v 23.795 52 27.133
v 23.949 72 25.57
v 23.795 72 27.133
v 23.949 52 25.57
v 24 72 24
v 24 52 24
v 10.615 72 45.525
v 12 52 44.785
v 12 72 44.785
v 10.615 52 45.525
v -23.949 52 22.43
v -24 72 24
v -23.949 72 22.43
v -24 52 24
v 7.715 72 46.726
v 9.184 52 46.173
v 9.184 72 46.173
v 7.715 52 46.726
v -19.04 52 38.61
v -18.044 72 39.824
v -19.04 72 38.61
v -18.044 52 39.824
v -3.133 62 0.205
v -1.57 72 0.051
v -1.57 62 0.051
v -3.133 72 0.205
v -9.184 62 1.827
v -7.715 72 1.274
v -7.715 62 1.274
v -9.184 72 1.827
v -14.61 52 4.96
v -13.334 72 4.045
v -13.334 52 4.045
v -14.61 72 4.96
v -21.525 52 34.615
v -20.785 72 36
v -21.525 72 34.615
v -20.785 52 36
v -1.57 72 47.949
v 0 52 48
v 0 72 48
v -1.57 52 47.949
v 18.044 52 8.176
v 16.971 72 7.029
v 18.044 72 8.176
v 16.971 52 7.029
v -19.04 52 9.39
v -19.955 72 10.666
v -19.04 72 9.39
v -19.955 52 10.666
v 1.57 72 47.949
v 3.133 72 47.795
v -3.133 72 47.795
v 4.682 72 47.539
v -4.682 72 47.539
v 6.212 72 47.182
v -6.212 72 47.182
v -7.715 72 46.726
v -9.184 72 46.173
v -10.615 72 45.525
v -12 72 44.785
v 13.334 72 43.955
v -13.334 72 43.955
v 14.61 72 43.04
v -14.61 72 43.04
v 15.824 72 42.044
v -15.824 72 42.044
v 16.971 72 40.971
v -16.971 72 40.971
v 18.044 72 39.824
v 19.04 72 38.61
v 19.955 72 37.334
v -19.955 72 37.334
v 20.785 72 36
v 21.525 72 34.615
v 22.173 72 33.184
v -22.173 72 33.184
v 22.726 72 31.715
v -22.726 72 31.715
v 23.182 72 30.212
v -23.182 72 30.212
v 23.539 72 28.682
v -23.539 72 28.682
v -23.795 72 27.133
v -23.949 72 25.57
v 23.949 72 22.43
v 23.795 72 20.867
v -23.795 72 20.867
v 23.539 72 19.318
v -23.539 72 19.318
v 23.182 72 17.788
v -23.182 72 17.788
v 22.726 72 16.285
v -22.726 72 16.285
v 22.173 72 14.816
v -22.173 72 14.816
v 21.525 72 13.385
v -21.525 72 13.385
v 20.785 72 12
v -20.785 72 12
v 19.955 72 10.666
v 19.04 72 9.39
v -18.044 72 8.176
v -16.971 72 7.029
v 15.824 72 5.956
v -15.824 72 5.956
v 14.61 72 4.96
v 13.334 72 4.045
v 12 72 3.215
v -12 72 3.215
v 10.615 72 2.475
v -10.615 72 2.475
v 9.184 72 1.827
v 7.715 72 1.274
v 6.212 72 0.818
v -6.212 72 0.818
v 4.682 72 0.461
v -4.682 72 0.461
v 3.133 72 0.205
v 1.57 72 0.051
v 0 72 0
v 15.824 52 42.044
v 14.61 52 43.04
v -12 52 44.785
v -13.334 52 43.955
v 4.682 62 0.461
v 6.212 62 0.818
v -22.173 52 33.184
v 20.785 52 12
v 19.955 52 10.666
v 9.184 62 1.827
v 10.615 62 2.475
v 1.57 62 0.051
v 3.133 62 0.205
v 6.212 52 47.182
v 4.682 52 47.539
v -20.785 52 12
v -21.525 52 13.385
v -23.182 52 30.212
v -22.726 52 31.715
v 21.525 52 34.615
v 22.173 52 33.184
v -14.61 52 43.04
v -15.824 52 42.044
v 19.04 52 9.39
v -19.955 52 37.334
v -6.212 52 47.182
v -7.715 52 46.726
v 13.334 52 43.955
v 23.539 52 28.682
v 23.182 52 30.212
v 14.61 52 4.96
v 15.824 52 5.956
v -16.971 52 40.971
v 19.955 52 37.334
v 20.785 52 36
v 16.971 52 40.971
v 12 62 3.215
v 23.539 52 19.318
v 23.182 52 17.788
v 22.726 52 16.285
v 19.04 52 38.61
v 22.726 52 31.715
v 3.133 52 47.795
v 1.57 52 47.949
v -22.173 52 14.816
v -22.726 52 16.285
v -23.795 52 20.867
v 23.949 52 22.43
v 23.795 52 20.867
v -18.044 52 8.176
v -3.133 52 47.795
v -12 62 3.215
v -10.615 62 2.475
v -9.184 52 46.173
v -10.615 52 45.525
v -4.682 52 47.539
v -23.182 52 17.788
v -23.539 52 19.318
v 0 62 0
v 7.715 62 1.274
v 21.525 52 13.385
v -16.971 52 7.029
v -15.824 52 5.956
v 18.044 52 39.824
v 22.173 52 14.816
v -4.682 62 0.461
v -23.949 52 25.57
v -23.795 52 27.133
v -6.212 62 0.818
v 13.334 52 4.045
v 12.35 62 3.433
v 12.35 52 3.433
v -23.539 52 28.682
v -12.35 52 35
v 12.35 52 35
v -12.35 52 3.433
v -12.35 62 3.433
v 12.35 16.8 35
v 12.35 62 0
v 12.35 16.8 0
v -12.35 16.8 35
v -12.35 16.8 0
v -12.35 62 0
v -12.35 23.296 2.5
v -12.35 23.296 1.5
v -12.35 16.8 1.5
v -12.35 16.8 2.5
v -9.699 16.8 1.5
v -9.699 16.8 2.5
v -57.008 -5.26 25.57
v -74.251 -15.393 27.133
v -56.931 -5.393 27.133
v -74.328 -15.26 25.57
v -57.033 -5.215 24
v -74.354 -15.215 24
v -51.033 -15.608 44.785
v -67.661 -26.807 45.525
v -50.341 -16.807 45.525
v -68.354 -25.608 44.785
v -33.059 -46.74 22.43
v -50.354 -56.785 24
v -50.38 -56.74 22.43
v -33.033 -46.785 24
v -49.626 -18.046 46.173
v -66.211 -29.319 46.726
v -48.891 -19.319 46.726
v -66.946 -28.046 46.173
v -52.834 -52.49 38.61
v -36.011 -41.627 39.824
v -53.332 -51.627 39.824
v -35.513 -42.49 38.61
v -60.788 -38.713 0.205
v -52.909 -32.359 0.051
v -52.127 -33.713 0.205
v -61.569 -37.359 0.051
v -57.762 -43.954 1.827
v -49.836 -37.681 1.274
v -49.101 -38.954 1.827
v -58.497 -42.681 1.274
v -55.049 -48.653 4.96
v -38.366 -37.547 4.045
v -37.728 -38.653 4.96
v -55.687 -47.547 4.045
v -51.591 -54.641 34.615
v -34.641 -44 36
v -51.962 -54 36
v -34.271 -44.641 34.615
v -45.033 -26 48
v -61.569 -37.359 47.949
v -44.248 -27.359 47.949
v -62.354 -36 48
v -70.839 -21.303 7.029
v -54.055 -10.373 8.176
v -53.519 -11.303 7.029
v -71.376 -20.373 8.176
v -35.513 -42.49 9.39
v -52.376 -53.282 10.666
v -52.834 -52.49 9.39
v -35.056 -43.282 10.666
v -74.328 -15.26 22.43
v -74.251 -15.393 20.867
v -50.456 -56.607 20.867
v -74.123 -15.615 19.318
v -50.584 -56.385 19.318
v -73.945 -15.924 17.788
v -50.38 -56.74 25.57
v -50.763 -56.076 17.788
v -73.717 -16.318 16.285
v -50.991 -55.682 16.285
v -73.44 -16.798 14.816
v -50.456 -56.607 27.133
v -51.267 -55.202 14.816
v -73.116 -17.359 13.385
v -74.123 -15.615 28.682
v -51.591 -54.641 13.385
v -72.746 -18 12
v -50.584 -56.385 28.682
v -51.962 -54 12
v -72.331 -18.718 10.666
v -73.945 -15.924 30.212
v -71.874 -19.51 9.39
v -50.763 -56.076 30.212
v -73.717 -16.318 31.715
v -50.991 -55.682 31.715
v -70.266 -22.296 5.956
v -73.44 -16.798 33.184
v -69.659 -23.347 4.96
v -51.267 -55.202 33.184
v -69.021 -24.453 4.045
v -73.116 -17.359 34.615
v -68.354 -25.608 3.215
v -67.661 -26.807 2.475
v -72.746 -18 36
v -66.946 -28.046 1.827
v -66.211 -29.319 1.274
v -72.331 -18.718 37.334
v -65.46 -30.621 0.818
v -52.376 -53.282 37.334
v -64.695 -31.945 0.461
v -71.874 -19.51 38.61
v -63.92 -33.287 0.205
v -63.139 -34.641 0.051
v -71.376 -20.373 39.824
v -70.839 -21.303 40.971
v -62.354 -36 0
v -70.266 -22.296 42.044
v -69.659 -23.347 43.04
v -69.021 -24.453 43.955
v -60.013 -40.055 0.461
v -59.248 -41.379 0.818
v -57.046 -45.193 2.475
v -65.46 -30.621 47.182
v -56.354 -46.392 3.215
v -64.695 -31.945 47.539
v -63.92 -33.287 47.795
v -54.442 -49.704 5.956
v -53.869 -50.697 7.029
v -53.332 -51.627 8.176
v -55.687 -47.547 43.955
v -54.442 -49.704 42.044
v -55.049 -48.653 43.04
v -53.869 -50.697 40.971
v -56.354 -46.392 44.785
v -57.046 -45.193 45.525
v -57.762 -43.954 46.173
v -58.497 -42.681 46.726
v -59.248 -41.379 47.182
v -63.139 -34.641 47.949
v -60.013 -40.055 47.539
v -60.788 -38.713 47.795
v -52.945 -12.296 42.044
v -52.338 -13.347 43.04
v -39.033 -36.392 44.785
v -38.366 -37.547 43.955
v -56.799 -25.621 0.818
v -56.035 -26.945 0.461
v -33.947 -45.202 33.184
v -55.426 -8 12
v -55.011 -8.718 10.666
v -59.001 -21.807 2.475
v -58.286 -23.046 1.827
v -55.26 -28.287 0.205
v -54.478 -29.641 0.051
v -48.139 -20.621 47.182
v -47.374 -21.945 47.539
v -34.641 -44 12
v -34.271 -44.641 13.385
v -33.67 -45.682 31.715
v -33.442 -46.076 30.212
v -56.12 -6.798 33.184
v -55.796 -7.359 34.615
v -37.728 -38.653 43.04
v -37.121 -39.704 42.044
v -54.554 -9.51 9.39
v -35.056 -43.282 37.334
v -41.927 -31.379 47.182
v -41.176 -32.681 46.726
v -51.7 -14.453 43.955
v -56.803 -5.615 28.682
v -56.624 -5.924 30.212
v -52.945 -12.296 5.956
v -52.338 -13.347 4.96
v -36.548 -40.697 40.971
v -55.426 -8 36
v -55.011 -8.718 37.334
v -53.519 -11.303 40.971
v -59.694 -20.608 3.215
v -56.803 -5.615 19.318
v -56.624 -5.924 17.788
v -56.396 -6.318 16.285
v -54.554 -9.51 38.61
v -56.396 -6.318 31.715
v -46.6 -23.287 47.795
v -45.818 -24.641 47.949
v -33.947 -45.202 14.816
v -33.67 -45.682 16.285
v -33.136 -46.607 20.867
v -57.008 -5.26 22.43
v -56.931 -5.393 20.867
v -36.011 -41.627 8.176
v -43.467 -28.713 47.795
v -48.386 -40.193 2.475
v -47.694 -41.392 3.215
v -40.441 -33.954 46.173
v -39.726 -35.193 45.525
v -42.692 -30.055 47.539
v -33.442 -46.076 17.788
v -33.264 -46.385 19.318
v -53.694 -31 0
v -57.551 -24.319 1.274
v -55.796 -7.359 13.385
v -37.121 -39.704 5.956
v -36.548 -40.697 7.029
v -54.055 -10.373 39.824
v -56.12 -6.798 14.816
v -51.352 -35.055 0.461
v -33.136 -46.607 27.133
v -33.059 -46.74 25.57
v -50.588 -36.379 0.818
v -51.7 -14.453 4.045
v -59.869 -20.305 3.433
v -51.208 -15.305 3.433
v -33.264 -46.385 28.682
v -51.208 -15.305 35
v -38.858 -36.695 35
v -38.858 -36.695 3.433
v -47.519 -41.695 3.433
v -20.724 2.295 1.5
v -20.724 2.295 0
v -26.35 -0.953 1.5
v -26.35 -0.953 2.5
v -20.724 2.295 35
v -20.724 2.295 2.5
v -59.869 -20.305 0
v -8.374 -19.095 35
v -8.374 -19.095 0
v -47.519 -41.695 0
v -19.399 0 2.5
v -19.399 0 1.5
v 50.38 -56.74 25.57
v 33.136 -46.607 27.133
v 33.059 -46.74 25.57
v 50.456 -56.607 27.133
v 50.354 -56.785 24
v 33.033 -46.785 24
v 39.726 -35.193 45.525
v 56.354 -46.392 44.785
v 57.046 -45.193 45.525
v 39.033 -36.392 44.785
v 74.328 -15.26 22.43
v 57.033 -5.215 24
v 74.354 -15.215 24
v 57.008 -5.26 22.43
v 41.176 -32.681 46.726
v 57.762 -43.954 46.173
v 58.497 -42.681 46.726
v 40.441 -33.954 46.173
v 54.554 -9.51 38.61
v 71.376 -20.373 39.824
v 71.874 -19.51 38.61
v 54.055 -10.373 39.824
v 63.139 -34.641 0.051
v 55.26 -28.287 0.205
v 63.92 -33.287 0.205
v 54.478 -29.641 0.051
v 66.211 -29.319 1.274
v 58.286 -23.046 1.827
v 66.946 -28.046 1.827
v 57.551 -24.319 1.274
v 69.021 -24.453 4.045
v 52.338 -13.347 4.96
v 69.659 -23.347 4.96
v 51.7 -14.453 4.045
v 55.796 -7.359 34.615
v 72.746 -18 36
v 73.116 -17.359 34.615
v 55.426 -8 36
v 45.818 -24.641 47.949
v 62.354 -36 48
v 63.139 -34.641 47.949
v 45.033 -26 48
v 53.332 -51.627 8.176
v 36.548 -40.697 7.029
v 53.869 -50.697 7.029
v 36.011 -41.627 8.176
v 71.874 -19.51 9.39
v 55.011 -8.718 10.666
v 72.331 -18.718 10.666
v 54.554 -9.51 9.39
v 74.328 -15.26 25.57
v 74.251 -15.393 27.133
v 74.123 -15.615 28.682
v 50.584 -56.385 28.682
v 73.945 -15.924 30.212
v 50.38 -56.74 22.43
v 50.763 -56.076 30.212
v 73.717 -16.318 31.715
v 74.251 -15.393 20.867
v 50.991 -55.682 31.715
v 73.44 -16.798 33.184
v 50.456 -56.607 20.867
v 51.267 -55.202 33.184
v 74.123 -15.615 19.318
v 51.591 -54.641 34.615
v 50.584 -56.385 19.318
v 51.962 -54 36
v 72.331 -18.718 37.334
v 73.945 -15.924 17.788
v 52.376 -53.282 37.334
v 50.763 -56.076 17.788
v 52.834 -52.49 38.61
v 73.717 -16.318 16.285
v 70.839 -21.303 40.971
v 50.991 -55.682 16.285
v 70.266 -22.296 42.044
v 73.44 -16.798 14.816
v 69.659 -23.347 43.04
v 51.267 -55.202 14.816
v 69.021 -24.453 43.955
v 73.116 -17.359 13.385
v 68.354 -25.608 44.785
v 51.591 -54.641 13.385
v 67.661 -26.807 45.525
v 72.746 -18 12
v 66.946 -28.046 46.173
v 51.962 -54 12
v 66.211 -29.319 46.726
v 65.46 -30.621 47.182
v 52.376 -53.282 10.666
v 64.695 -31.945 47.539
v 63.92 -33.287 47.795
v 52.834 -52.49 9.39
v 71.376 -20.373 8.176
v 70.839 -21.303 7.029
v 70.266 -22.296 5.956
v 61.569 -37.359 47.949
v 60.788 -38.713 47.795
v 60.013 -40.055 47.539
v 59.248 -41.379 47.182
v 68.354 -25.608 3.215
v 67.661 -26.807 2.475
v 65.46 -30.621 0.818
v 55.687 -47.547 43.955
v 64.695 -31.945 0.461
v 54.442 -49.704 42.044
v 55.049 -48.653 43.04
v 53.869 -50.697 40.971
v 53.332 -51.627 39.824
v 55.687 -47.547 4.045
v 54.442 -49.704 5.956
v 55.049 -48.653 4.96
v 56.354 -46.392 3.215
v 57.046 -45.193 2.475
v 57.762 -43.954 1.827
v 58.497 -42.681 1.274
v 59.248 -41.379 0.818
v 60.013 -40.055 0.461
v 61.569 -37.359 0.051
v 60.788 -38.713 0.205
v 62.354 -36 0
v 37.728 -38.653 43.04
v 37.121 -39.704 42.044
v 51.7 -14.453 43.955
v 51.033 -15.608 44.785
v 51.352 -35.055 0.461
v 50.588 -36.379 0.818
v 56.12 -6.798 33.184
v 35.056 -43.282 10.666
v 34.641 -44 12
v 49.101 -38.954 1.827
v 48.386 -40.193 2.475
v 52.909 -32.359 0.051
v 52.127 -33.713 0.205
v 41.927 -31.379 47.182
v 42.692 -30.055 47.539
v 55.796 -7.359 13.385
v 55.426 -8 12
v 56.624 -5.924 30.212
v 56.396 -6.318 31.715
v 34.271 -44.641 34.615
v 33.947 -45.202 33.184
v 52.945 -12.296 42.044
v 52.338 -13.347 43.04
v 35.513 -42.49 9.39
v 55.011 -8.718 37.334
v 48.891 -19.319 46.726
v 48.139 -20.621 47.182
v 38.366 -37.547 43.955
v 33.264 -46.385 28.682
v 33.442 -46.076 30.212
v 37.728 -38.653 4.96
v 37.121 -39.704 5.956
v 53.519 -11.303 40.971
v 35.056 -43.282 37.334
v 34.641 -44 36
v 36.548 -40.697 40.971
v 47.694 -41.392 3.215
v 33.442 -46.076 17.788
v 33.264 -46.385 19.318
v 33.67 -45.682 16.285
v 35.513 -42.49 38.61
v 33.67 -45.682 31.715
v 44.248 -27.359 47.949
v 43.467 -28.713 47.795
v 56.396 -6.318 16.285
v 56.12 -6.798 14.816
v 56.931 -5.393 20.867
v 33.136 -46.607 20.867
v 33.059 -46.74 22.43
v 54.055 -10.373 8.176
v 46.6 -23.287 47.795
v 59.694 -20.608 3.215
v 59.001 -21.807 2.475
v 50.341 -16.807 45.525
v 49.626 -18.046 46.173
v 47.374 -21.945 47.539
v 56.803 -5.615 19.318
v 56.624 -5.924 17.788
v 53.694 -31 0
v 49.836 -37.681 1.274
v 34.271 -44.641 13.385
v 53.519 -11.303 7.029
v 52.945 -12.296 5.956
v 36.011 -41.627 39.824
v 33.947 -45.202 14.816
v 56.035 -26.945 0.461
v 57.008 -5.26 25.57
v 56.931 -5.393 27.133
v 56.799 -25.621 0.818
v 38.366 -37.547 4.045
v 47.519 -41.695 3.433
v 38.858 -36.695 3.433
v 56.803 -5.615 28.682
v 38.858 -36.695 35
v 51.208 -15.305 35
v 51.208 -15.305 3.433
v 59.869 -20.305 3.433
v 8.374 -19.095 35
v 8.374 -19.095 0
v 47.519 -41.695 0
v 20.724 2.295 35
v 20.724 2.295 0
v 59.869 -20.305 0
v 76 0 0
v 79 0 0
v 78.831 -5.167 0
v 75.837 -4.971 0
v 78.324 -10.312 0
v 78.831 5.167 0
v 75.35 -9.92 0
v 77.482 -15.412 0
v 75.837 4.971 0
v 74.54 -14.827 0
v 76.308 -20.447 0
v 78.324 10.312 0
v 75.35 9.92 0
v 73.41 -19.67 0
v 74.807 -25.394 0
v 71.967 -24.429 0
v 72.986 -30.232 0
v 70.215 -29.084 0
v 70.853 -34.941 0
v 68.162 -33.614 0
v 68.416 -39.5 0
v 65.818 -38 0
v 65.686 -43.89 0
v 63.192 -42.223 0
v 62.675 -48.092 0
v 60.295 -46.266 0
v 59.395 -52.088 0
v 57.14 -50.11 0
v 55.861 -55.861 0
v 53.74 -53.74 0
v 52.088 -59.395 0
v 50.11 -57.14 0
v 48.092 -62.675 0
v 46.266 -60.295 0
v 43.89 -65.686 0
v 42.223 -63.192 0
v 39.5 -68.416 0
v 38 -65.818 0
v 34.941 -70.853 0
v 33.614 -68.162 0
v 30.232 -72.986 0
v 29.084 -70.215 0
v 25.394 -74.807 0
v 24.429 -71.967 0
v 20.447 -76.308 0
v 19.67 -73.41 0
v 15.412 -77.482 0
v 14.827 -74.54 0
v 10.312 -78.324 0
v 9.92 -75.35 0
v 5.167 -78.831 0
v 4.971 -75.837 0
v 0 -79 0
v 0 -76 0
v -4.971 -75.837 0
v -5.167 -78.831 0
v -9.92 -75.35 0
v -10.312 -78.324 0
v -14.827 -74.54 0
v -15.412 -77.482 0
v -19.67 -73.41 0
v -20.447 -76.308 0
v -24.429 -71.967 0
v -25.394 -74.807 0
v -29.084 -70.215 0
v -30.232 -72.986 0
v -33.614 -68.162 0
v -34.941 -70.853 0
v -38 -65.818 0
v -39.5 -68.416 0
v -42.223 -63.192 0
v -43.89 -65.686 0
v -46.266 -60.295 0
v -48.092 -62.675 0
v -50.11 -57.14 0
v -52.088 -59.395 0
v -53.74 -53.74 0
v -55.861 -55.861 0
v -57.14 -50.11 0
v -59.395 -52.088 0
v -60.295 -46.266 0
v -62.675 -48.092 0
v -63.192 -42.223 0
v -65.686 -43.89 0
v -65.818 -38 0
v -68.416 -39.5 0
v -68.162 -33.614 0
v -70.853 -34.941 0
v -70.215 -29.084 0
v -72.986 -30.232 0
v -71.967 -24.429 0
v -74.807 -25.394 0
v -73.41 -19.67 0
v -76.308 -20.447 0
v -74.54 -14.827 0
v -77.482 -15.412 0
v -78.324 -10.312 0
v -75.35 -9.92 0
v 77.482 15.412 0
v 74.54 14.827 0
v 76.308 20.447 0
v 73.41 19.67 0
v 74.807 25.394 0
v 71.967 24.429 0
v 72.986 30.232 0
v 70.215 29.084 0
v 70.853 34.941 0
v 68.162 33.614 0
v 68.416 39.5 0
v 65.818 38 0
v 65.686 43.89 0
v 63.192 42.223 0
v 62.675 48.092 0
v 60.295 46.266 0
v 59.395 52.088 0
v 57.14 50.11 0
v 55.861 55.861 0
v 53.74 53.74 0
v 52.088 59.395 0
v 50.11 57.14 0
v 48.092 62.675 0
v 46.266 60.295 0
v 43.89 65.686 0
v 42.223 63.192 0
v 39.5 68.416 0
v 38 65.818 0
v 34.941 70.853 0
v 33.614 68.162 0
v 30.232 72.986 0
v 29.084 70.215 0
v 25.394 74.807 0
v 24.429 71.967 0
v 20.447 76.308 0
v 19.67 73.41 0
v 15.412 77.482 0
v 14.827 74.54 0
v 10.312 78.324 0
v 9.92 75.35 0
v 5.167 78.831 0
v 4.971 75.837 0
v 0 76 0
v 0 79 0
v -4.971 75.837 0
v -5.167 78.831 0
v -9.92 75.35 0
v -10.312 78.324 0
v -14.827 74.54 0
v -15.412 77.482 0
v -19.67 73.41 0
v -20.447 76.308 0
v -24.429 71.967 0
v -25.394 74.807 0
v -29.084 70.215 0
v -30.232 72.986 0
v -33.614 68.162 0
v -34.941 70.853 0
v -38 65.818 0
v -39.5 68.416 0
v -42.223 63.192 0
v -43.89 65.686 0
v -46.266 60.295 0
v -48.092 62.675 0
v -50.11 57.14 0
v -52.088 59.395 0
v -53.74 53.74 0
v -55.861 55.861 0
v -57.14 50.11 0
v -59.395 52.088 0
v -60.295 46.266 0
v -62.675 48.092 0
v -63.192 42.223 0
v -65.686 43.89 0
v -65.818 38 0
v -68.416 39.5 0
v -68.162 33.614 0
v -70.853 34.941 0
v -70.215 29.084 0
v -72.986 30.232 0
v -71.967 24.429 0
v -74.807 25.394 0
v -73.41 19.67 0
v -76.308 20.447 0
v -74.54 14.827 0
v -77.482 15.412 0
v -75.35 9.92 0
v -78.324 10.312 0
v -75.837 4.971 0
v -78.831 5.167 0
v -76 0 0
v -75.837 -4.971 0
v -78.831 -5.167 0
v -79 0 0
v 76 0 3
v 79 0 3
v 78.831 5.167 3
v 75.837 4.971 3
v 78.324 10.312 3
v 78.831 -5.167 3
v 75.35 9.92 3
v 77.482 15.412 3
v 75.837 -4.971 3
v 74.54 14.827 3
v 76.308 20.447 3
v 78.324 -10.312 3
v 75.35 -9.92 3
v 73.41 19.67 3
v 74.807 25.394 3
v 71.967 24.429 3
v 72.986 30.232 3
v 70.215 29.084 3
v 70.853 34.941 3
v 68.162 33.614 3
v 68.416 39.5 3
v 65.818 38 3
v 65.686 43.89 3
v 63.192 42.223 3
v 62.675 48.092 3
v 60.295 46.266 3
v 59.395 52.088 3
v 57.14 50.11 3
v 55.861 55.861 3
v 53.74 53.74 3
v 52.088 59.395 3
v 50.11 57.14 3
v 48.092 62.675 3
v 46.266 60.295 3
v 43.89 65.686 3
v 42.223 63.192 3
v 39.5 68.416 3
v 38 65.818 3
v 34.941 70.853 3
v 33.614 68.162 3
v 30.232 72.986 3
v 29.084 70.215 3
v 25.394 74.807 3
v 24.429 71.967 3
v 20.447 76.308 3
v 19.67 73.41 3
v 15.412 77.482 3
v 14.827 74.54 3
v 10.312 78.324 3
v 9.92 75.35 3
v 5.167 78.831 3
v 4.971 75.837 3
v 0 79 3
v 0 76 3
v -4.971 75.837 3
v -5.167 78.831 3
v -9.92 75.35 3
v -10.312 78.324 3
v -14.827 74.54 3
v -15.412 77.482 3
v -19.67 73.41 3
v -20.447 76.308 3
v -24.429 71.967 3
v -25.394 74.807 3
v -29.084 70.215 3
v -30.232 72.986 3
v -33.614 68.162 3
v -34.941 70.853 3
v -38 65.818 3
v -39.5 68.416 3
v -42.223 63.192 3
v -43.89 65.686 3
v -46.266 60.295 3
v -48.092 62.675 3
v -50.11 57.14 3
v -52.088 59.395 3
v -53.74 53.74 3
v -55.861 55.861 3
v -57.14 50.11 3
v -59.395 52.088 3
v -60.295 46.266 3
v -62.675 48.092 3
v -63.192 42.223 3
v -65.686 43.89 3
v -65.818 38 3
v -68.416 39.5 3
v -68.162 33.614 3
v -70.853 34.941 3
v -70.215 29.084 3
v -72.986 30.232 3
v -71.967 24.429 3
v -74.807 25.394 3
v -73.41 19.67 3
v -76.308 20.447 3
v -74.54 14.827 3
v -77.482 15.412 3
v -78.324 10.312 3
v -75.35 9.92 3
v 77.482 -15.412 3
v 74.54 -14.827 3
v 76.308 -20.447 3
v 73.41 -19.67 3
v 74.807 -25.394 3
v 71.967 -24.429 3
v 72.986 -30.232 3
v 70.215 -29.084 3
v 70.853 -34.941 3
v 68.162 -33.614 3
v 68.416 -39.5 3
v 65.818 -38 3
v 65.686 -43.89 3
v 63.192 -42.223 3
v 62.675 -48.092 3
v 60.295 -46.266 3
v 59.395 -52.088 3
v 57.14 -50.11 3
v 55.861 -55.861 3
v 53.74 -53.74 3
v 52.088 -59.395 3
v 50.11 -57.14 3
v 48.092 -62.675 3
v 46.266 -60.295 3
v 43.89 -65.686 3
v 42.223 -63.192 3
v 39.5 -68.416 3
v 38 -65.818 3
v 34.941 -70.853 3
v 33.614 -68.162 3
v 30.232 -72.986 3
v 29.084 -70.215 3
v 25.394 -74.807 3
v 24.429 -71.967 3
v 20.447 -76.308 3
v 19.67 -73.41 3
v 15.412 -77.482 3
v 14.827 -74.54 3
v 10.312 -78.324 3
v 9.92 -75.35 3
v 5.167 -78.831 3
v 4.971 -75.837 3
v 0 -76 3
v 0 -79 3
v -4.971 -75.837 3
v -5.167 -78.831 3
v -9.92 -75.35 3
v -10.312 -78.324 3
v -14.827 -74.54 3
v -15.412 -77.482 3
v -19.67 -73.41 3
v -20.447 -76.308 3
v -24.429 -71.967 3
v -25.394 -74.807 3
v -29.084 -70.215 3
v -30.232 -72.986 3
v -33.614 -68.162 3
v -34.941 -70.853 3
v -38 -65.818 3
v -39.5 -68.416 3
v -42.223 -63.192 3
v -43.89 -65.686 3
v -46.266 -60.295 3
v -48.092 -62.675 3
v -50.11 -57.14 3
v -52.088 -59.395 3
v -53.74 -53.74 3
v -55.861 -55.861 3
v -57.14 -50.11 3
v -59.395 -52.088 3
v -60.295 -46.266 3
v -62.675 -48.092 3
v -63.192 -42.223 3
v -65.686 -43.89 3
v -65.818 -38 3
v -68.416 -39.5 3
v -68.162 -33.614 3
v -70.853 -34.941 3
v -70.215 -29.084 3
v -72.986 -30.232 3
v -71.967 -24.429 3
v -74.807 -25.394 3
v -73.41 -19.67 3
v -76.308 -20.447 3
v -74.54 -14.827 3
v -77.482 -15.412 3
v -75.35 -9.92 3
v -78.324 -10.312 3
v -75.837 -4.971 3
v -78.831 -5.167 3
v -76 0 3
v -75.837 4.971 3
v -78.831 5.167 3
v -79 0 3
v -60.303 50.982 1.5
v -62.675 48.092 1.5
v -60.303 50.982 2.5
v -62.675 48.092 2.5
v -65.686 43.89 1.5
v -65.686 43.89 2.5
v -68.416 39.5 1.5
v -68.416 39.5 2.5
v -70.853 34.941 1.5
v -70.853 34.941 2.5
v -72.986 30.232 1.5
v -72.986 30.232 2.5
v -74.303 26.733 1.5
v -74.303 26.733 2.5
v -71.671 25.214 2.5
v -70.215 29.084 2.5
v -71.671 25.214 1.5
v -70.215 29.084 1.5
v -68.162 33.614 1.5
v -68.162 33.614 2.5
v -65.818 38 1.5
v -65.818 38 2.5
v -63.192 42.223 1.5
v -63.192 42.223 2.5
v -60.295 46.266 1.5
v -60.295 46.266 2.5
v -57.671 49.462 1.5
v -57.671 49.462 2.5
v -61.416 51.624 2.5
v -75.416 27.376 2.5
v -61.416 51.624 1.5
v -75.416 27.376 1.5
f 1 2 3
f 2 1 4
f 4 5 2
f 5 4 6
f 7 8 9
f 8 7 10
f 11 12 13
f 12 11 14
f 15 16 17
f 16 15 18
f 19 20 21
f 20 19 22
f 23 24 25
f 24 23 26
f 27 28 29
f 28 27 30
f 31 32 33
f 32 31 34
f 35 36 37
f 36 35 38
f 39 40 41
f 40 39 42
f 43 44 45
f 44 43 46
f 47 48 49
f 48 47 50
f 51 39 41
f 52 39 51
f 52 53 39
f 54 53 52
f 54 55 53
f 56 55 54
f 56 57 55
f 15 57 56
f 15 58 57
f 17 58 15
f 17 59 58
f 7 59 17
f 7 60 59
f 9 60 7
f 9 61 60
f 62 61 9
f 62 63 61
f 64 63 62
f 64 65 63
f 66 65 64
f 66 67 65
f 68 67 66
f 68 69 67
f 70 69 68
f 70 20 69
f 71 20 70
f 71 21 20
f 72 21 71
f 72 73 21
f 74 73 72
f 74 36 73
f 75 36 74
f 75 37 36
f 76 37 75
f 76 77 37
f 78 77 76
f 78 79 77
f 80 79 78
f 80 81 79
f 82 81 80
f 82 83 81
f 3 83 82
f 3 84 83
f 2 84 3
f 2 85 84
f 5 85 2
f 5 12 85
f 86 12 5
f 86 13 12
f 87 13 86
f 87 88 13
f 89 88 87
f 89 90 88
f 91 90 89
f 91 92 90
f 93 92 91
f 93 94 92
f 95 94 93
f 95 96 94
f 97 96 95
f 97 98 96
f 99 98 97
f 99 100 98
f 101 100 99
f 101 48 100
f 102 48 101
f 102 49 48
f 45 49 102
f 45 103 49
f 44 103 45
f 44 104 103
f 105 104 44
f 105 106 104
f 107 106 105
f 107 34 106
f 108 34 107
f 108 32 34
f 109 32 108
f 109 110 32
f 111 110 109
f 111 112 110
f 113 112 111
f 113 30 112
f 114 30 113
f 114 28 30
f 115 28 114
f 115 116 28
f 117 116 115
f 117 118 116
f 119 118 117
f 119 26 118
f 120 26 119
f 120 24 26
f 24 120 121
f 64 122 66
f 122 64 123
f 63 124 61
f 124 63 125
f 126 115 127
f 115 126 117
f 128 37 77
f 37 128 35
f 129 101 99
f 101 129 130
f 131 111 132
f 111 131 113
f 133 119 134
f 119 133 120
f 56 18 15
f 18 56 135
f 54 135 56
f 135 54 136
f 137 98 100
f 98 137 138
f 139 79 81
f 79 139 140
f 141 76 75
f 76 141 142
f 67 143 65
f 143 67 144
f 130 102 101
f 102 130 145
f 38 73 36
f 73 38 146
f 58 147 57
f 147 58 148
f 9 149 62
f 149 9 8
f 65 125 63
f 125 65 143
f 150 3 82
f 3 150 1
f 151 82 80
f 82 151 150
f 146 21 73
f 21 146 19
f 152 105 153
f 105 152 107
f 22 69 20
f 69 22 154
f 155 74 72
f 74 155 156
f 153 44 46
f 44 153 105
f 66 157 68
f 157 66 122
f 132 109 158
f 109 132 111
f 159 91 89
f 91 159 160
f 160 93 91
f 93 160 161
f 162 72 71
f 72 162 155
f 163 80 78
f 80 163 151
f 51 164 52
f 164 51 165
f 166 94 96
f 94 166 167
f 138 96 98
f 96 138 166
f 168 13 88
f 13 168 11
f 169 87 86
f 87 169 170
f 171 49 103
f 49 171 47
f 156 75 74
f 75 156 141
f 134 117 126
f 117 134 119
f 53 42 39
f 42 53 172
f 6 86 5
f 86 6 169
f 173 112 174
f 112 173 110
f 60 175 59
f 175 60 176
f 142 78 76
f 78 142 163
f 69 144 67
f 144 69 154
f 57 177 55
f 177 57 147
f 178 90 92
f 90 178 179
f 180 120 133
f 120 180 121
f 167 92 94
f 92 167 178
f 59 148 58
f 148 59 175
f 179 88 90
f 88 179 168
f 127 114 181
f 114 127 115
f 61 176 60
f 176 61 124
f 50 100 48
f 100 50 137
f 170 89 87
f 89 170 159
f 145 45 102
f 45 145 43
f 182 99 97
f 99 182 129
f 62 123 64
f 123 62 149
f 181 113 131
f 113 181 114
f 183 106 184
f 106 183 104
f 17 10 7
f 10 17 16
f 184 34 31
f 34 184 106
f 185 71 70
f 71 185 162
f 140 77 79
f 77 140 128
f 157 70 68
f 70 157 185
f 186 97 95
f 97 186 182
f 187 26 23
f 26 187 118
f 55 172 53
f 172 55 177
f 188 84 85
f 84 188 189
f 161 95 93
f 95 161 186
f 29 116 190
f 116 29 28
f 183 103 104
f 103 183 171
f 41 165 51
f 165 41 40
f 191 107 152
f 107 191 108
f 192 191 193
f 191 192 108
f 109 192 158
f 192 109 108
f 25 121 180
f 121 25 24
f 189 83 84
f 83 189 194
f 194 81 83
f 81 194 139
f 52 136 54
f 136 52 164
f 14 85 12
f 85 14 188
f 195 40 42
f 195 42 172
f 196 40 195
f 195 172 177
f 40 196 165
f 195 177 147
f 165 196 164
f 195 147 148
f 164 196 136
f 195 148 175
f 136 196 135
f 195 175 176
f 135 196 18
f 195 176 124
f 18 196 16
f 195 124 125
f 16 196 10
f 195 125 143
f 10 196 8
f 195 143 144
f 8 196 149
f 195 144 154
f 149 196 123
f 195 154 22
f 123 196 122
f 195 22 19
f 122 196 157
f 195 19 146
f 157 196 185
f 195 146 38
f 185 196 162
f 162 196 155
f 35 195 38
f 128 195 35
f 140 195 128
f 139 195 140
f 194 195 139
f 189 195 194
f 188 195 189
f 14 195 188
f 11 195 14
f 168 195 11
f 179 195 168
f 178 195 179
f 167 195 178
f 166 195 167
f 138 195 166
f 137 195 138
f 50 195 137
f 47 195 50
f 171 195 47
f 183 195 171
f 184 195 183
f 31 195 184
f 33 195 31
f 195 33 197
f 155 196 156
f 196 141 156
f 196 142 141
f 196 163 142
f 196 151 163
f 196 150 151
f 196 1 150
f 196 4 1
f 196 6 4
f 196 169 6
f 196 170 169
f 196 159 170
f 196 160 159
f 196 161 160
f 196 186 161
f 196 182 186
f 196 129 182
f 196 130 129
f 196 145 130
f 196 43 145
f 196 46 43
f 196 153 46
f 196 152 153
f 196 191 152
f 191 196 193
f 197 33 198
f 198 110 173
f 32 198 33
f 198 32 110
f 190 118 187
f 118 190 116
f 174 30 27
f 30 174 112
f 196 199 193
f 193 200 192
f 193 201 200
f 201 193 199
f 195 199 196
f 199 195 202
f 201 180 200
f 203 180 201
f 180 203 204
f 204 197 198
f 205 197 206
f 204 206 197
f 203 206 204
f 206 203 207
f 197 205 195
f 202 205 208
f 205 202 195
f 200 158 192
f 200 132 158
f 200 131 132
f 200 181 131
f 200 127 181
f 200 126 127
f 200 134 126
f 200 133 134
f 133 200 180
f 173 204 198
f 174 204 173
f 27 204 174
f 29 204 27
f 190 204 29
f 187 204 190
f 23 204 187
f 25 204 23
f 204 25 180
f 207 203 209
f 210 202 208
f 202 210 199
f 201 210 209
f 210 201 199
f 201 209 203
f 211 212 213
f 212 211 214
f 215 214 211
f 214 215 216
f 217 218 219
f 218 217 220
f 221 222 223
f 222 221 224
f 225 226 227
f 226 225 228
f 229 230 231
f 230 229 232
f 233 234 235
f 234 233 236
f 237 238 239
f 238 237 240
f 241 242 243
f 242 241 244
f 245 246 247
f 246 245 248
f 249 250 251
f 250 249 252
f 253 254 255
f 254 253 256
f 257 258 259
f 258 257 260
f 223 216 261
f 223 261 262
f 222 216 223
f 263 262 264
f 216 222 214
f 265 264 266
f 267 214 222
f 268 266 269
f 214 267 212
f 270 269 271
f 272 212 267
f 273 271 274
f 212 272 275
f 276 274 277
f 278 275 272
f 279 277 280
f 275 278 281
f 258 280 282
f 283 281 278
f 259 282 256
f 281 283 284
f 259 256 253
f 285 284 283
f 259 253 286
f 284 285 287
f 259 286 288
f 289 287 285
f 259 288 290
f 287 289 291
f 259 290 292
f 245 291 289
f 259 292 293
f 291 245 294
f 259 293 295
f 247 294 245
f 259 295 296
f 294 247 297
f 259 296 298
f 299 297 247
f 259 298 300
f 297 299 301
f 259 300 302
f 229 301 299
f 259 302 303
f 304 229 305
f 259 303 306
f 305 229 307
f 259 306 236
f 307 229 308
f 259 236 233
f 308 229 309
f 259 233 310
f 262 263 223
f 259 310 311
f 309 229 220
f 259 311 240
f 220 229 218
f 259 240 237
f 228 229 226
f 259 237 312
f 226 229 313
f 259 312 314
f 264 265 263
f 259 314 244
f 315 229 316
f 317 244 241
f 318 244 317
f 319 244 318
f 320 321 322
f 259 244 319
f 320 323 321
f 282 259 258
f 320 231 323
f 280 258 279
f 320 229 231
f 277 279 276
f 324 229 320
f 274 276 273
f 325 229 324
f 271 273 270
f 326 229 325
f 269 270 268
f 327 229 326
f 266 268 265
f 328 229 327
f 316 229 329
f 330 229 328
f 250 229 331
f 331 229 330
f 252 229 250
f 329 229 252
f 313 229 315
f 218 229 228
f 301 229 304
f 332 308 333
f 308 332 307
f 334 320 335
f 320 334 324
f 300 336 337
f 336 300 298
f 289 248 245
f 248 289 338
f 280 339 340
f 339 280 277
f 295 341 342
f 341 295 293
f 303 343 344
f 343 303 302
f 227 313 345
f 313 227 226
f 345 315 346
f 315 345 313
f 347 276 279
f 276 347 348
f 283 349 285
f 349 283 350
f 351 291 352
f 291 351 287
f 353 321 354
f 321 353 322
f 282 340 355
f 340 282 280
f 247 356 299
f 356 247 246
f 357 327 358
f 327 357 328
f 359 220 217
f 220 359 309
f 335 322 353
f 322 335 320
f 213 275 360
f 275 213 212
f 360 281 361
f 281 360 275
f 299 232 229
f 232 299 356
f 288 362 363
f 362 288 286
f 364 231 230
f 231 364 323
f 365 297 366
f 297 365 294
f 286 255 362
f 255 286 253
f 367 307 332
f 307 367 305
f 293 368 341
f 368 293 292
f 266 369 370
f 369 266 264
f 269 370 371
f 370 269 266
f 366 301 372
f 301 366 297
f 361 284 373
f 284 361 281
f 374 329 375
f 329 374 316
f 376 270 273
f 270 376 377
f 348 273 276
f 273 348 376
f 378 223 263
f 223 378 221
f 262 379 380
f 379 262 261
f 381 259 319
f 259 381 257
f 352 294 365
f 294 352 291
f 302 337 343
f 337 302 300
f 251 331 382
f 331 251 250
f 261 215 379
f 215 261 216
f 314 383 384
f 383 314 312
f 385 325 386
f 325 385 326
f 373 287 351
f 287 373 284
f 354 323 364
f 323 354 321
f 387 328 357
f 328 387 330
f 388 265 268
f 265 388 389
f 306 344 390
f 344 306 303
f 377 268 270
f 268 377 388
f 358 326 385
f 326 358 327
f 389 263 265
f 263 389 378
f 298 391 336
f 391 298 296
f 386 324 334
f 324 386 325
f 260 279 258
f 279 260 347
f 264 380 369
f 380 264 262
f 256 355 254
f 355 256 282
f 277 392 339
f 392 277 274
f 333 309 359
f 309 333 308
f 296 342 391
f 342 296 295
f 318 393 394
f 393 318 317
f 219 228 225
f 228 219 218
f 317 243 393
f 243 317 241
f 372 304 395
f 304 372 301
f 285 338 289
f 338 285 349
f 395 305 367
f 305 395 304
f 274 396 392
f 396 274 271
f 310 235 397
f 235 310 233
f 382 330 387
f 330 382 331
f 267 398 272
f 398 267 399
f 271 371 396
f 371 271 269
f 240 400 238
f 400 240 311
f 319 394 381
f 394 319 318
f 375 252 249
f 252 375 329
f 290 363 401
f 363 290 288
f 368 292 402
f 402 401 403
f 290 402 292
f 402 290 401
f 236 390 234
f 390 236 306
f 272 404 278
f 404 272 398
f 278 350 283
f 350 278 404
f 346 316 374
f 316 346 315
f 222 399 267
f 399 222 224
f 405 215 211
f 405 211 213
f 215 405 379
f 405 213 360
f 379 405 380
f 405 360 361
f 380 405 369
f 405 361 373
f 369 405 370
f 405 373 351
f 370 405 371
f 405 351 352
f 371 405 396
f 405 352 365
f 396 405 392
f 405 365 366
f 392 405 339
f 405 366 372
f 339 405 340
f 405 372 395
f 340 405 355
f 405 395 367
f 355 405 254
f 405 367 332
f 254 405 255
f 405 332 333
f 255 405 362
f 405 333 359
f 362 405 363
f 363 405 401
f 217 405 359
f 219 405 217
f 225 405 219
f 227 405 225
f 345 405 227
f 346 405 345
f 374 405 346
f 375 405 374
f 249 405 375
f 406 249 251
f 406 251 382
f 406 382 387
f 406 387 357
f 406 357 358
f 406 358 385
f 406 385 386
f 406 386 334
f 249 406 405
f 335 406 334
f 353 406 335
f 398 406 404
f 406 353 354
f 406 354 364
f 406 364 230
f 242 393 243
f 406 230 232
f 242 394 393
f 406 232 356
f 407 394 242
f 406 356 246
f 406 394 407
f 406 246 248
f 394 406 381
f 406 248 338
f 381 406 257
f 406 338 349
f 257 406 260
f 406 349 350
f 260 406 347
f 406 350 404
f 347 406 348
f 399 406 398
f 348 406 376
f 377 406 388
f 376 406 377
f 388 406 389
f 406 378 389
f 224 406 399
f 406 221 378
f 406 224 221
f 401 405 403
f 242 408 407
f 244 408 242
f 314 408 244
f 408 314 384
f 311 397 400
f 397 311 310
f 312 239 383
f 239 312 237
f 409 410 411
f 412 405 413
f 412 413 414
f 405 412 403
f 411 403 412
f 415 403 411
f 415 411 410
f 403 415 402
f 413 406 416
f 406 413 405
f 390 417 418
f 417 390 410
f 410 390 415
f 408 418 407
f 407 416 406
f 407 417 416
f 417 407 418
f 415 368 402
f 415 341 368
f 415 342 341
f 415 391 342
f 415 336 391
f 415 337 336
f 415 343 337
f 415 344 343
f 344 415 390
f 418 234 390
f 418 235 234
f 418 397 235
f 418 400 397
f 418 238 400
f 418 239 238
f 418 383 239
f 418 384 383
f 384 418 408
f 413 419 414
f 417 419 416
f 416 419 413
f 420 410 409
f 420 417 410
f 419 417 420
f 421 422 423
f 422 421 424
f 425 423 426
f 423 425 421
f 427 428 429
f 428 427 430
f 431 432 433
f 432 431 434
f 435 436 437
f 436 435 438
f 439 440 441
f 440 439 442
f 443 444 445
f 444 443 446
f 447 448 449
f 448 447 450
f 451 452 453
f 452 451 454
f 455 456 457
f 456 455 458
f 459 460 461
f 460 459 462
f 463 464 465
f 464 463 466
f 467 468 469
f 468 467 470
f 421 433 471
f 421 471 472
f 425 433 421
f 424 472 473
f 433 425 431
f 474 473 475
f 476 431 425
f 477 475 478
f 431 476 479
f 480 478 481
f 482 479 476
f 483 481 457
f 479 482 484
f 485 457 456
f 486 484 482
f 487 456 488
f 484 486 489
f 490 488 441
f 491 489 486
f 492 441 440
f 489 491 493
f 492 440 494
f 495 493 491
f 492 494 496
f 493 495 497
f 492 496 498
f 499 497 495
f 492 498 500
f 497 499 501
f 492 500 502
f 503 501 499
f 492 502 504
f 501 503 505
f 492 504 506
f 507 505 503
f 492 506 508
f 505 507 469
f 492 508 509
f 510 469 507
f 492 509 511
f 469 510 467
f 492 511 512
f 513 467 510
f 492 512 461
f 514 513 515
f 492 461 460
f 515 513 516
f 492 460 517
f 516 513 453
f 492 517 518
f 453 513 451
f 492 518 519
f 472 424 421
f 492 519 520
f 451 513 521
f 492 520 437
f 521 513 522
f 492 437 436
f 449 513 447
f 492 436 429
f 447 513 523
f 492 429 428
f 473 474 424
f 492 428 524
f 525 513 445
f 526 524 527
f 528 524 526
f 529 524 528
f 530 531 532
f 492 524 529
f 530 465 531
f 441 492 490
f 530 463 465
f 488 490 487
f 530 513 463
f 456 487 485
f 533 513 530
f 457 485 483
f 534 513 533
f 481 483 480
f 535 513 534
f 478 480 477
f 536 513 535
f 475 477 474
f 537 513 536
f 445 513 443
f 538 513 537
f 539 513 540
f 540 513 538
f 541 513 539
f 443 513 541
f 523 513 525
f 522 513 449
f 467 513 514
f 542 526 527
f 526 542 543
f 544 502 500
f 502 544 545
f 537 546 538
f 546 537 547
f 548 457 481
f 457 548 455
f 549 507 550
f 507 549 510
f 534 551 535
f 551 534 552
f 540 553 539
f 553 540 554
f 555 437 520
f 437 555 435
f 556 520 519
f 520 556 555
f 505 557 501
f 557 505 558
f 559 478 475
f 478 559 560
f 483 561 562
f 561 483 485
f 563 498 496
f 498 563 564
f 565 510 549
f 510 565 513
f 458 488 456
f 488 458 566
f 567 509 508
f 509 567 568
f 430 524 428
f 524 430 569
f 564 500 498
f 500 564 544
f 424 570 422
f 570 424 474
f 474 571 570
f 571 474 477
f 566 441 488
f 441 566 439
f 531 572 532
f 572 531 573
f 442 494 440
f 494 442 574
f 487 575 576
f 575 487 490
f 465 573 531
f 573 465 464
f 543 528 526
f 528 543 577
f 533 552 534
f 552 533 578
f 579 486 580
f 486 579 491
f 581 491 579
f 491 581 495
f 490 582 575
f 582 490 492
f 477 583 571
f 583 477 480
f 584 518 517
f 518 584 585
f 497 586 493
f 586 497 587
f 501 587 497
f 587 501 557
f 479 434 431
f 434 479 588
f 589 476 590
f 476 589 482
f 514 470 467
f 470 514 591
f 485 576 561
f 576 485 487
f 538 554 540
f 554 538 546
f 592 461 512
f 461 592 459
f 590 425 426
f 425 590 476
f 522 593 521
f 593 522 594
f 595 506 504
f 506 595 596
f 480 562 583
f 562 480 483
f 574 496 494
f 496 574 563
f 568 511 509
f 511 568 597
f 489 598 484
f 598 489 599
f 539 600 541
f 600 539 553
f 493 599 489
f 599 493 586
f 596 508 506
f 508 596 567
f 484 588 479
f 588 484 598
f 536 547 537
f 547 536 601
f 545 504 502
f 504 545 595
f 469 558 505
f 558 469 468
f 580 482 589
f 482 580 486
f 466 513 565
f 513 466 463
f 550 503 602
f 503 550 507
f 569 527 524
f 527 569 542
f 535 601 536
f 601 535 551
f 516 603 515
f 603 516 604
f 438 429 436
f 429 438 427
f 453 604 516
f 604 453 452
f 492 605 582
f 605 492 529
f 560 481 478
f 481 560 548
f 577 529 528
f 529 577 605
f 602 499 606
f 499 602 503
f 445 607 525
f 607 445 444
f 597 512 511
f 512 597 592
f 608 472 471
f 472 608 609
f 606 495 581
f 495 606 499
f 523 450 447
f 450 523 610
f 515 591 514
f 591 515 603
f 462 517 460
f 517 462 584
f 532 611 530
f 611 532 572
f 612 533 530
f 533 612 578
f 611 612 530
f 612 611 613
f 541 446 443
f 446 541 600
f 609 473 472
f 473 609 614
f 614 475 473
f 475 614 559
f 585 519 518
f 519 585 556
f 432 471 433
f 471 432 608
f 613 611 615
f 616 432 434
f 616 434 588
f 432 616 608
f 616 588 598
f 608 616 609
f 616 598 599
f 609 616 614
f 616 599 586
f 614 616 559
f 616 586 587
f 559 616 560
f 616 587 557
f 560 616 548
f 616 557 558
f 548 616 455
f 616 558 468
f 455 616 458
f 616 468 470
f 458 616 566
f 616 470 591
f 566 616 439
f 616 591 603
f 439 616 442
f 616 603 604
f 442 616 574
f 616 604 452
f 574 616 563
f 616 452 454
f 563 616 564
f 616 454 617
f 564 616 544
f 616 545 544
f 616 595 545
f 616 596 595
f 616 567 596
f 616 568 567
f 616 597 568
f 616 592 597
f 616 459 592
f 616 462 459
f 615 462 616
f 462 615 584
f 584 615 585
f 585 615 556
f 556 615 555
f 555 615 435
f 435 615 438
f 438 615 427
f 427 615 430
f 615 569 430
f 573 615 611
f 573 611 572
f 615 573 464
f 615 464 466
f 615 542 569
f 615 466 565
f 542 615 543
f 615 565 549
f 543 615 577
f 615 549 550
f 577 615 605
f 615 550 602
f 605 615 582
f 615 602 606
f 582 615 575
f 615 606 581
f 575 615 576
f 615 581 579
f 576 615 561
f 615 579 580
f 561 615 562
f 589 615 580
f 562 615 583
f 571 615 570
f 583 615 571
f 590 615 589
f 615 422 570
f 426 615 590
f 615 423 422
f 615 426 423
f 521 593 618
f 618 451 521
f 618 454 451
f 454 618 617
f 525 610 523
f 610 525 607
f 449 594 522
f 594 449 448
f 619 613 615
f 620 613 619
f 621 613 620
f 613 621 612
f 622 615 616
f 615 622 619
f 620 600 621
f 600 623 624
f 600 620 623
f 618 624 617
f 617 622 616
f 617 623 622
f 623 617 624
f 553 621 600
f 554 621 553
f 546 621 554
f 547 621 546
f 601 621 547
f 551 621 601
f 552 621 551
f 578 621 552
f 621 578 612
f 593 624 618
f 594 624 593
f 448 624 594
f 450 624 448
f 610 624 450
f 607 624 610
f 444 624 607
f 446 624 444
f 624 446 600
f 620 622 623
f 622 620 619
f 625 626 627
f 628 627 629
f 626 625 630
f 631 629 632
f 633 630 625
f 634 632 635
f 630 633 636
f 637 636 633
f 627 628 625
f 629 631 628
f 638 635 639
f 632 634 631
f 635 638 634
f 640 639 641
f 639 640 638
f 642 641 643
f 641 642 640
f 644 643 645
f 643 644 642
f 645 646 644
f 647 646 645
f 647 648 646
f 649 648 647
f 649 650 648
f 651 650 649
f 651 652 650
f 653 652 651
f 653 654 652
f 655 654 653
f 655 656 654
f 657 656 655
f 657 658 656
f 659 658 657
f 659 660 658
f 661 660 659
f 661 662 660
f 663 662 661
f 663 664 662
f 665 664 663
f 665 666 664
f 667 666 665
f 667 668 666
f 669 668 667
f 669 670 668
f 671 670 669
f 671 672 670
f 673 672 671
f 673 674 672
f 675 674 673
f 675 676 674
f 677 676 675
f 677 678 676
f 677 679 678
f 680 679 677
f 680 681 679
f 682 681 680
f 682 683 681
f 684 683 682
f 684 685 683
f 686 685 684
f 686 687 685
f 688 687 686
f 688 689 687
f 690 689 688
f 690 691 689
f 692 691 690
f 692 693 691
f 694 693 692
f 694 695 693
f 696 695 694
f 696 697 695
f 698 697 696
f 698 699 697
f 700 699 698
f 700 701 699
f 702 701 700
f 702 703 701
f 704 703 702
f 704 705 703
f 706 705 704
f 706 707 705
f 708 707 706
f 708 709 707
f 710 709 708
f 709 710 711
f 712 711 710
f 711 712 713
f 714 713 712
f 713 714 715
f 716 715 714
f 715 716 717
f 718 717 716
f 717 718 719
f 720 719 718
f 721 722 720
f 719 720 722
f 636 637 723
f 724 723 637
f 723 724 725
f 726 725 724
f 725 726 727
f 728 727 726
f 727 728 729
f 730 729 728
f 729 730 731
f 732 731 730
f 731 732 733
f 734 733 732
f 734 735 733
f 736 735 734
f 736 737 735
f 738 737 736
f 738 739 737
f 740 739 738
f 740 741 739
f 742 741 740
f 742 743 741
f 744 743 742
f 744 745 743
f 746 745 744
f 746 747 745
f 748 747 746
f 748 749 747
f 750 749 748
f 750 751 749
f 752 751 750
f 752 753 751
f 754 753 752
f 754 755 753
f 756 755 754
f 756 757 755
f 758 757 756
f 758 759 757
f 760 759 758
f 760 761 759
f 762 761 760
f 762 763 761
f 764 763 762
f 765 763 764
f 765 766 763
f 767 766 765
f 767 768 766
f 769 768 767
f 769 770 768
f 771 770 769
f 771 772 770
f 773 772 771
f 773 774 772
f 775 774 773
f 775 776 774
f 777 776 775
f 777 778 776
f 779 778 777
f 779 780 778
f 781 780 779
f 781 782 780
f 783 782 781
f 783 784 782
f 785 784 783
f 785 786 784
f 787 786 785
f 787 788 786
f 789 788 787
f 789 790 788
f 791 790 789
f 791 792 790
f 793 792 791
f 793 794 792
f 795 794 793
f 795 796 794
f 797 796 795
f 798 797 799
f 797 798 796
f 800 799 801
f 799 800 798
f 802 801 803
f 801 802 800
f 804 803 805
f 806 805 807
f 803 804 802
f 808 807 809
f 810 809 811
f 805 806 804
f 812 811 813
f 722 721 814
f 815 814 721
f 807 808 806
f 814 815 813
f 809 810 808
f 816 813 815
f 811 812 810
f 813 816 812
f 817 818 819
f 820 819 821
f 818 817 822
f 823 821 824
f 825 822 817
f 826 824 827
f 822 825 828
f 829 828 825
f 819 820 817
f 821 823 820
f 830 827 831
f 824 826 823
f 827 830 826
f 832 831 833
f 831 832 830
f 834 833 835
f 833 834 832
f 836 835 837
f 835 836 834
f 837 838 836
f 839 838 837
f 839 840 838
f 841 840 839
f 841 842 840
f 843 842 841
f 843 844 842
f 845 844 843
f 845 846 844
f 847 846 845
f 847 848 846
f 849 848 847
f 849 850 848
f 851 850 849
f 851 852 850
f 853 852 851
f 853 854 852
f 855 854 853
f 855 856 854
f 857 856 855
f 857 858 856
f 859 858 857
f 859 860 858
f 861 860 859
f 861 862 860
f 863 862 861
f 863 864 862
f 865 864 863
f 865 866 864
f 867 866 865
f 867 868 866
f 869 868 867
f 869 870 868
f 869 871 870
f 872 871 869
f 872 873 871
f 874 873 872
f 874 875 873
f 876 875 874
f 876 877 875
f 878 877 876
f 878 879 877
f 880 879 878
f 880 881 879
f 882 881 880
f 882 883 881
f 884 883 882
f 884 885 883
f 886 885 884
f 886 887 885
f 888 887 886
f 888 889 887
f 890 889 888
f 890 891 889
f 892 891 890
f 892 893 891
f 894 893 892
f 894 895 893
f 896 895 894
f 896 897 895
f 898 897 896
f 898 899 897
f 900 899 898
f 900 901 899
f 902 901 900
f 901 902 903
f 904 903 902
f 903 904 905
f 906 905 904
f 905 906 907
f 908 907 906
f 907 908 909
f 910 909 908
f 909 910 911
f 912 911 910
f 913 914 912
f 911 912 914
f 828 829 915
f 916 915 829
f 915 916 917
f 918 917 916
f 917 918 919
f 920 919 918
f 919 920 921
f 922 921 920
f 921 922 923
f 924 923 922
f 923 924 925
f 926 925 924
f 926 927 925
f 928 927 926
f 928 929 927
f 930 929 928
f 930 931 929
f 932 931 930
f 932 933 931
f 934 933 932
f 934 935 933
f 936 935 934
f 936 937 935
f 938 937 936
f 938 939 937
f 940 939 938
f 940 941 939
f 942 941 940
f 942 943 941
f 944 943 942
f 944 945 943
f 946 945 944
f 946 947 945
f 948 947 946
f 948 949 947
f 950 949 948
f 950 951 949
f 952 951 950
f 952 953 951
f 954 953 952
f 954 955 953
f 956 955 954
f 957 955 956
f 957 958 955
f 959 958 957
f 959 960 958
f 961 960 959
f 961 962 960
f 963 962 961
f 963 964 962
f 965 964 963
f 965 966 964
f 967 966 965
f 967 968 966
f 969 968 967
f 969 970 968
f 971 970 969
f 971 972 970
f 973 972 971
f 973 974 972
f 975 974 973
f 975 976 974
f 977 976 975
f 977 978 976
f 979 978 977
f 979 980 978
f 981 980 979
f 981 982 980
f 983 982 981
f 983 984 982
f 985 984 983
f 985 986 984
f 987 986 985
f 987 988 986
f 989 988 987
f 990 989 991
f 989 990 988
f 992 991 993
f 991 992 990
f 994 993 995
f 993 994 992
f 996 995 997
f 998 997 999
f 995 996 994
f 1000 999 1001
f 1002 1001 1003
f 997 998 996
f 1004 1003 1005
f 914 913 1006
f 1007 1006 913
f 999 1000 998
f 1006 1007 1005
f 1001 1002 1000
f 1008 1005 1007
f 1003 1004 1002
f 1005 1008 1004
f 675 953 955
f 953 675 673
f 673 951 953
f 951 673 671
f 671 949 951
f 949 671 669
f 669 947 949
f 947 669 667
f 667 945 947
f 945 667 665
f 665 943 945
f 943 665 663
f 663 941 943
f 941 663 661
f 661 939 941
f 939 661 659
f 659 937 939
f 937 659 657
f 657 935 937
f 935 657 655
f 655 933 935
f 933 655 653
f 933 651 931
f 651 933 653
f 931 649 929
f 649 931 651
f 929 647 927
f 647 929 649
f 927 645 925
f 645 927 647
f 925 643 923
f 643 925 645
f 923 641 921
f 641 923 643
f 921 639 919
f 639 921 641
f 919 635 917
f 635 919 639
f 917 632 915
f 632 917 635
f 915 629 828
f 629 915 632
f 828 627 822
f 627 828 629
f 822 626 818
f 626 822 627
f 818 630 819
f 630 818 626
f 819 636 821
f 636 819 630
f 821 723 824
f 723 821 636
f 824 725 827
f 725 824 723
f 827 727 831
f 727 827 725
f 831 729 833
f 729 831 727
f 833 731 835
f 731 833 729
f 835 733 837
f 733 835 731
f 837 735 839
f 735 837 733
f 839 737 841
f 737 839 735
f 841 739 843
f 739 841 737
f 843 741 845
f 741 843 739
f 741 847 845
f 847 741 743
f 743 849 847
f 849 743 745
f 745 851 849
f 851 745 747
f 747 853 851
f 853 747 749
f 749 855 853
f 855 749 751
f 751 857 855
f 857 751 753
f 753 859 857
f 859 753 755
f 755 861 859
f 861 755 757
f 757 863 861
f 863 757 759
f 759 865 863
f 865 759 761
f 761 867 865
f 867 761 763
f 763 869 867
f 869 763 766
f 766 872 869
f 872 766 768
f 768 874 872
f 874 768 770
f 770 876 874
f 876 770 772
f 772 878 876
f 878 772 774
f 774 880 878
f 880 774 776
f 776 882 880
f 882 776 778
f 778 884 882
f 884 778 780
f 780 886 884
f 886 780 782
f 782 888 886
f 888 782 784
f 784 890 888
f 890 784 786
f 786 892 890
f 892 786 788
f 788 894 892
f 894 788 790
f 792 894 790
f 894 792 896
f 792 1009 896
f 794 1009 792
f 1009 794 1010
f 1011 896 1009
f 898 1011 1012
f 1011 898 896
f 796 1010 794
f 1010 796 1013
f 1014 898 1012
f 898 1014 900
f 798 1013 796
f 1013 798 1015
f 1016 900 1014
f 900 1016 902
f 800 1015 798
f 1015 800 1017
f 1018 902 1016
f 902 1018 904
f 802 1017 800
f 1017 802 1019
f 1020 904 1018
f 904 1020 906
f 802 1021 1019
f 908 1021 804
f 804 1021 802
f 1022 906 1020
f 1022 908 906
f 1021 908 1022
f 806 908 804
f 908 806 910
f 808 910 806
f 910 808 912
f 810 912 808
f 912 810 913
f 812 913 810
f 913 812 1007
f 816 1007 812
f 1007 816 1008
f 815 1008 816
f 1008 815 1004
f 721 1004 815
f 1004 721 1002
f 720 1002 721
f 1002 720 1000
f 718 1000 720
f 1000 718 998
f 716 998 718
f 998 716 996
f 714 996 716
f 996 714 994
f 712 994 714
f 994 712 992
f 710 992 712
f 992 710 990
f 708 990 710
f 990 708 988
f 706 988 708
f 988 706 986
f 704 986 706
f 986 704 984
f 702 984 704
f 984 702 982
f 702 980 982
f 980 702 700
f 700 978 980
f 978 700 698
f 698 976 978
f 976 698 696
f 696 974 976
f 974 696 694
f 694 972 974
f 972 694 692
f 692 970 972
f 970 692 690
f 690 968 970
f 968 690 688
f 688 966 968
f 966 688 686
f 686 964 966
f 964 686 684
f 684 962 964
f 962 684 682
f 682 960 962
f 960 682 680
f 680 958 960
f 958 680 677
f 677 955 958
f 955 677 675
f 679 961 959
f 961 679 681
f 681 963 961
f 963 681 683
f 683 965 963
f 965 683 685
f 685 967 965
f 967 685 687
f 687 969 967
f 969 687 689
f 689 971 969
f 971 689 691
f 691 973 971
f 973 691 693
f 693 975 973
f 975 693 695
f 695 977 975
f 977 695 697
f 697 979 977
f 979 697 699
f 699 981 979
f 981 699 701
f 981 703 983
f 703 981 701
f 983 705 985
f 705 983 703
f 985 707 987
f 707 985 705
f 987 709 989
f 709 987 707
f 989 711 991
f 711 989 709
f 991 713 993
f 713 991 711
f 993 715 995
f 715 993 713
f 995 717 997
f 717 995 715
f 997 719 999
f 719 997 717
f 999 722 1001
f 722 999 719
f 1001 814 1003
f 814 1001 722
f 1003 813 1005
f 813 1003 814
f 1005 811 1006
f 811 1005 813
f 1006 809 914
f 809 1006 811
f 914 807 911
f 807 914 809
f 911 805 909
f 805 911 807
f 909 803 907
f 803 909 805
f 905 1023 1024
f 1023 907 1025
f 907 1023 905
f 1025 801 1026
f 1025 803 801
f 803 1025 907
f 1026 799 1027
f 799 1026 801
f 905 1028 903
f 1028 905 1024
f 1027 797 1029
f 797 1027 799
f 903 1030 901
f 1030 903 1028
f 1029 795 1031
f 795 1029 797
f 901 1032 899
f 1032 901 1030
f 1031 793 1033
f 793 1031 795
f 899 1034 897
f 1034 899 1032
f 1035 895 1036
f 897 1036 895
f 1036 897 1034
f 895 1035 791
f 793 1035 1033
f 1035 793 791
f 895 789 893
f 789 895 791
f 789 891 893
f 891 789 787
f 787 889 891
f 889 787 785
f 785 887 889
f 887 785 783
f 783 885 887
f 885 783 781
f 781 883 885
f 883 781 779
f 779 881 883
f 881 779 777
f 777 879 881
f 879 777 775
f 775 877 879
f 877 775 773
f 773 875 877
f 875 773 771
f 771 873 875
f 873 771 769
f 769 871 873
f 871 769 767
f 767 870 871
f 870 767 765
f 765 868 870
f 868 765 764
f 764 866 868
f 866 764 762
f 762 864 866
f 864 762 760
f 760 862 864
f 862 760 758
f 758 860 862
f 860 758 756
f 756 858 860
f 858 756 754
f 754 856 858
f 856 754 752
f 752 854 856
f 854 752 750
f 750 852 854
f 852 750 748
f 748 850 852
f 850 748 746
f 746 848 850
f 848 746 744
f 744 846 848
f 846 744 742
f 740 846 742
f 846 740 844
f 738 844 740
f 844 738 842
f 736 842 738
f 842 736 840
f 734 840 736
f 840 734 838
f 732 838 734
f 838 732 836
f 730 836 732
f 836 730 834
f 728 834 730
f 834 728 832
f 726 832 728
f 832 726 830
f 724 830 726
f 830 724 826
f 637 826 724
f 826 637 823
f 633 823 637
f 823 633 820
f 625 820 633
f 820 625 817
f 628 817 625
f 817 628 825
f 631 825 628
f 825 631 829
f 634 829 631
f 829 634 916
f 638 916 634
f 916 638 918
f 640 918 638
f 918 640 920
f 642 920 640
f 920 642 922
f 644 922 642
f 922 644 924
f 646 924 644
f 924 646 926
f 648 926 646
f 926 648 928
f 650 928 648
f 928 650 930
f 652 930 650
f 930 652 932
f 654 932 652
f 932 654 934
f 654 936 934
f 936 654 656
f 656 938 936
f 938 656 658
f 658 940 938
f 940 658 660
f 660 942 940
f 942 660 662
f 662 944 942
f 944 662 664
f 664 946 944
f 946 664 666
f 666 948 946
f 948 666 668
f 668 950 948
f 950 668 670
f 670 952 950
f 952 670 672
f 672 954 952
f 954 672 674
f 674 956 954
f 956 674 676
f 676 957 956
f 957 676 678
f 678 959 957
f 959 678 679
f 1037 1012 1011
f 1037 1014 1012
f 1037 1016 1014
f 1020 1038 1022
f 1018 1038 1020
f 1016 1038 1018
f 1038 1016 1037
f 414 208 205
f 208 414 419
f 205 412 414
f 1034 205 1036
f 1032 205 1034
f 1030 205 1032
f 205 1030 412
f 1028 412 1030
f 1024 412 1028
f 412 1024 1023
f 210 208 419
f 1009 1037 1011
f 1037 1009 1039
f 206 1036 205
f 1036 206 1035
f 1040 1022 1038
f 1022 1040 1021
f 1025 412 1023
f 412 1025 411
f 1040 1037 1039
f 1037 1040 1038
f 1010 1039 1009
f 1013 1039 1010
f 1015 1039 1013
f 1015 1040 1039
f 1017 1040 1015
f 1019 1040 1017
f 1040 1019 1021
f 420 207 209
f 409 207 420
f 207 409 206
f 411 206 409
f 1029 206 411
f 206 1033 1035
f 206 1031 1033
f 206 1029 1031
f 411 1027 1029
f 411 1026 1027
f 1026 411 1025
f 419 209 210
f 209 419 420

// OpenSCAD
/*
 * コロ助 φ158 ホロノミック・ベース 成立性検討 (feasibility mockup) / 2026-07-29
 *
 * 目的: 3×オムニ輪(48mm) + FEETECHバスサーボ を 120°配置で φ158 に収めつつ、
 *       胴底中央から出る RDK X5 の USBケーブル(想定 φ90 出口)を塞がないか検証する。
 *
 * 結論(数値): STS3215(45mm)は φ158 に収めると中央クリアが φ34 まで潰れ φ90 と衝突。
 *             STS3032(23mm・小型バスサーボ)なら中央 φ78 を確保でき、ほぼ両立する。
 *   -D SERVO=\"STS3032\" で小型サーボ版に切替。
 */
$fn = 96;
JBOT_D = 158;   // 胴裾径 = ベース外径
WALL   = 3;
SERVO  = "STS3215";                 // or "STS3032"
// [W(接線X), L(放射Y), H(Z)]
SG   = (SERVO=="STS3032") ? [12,23,27.5] : [24.7,45.2,35];
OMNI_D = 48;  OMNI_W = 20;           // オムニ輪 径/幅
RW     = (SERVO=="STS3032") ? 62 : 62;  // 車輪軸の半径位置
CABLE_D = 90;                        // 出したいケーブル出口(=現行 bottom_v3 の中央穴)

clear_r = RW - SG[1];                // 中央クリア半径(サーボ内端)
echo(str("SERVO=", SERVO, "  中央クリア=φ", 2*clear_r, "  車輪外縁R=", RW+OMNI_W/2));

module base(){
  color("#d97706") linear_extrude(WALL)
    difference(){ circle(d=JBOT_D); circle(d=JBOT_D-2*WALL); }
}
module drive_module(){
  // オムニ輪: 軸=放射(Y)方向、円板はX-Z面、下(-Z)へ接地
  color("#90caf9") translate([0,RW,OMNI_D/2]) rotate([90,0,0]) cylinder(d=OMNI_D,h=OMNI_W,center=true);
  // サーボ本体: 車輪から中心へ放射状に伸びる
  color("#37474f") translate([0, RW-SG[1]/2, SG[2]/2]) cube([SG[0],SG[1],SG[2]], center=true);
}

base();
for(a=[0,120,240]) rotate([0,0,a]) drive_module();

// 出したいケーブル柱(φ90) = 赤ゴースト。サーボと重なる=干渉。
%color("red")   translate([0,0,-2]) cylinder(d=CABLE_D,     h=60);
// 実際に確保できる中央クリア = 緑
%color("green") translate([0,0,-4]) cylinder(d=2*clear_r,   h=2);

// ケーブル逃がしレーン(サーボ間の120°ギャップ, +Y と 60°の中間=角度=60°方向) を明示
color("#c8e6c9") rotate([0,0,60]) translate([-14, clear_r, WALL/2]) cube([28, JBOT_D/2-clear_r, 1]);
